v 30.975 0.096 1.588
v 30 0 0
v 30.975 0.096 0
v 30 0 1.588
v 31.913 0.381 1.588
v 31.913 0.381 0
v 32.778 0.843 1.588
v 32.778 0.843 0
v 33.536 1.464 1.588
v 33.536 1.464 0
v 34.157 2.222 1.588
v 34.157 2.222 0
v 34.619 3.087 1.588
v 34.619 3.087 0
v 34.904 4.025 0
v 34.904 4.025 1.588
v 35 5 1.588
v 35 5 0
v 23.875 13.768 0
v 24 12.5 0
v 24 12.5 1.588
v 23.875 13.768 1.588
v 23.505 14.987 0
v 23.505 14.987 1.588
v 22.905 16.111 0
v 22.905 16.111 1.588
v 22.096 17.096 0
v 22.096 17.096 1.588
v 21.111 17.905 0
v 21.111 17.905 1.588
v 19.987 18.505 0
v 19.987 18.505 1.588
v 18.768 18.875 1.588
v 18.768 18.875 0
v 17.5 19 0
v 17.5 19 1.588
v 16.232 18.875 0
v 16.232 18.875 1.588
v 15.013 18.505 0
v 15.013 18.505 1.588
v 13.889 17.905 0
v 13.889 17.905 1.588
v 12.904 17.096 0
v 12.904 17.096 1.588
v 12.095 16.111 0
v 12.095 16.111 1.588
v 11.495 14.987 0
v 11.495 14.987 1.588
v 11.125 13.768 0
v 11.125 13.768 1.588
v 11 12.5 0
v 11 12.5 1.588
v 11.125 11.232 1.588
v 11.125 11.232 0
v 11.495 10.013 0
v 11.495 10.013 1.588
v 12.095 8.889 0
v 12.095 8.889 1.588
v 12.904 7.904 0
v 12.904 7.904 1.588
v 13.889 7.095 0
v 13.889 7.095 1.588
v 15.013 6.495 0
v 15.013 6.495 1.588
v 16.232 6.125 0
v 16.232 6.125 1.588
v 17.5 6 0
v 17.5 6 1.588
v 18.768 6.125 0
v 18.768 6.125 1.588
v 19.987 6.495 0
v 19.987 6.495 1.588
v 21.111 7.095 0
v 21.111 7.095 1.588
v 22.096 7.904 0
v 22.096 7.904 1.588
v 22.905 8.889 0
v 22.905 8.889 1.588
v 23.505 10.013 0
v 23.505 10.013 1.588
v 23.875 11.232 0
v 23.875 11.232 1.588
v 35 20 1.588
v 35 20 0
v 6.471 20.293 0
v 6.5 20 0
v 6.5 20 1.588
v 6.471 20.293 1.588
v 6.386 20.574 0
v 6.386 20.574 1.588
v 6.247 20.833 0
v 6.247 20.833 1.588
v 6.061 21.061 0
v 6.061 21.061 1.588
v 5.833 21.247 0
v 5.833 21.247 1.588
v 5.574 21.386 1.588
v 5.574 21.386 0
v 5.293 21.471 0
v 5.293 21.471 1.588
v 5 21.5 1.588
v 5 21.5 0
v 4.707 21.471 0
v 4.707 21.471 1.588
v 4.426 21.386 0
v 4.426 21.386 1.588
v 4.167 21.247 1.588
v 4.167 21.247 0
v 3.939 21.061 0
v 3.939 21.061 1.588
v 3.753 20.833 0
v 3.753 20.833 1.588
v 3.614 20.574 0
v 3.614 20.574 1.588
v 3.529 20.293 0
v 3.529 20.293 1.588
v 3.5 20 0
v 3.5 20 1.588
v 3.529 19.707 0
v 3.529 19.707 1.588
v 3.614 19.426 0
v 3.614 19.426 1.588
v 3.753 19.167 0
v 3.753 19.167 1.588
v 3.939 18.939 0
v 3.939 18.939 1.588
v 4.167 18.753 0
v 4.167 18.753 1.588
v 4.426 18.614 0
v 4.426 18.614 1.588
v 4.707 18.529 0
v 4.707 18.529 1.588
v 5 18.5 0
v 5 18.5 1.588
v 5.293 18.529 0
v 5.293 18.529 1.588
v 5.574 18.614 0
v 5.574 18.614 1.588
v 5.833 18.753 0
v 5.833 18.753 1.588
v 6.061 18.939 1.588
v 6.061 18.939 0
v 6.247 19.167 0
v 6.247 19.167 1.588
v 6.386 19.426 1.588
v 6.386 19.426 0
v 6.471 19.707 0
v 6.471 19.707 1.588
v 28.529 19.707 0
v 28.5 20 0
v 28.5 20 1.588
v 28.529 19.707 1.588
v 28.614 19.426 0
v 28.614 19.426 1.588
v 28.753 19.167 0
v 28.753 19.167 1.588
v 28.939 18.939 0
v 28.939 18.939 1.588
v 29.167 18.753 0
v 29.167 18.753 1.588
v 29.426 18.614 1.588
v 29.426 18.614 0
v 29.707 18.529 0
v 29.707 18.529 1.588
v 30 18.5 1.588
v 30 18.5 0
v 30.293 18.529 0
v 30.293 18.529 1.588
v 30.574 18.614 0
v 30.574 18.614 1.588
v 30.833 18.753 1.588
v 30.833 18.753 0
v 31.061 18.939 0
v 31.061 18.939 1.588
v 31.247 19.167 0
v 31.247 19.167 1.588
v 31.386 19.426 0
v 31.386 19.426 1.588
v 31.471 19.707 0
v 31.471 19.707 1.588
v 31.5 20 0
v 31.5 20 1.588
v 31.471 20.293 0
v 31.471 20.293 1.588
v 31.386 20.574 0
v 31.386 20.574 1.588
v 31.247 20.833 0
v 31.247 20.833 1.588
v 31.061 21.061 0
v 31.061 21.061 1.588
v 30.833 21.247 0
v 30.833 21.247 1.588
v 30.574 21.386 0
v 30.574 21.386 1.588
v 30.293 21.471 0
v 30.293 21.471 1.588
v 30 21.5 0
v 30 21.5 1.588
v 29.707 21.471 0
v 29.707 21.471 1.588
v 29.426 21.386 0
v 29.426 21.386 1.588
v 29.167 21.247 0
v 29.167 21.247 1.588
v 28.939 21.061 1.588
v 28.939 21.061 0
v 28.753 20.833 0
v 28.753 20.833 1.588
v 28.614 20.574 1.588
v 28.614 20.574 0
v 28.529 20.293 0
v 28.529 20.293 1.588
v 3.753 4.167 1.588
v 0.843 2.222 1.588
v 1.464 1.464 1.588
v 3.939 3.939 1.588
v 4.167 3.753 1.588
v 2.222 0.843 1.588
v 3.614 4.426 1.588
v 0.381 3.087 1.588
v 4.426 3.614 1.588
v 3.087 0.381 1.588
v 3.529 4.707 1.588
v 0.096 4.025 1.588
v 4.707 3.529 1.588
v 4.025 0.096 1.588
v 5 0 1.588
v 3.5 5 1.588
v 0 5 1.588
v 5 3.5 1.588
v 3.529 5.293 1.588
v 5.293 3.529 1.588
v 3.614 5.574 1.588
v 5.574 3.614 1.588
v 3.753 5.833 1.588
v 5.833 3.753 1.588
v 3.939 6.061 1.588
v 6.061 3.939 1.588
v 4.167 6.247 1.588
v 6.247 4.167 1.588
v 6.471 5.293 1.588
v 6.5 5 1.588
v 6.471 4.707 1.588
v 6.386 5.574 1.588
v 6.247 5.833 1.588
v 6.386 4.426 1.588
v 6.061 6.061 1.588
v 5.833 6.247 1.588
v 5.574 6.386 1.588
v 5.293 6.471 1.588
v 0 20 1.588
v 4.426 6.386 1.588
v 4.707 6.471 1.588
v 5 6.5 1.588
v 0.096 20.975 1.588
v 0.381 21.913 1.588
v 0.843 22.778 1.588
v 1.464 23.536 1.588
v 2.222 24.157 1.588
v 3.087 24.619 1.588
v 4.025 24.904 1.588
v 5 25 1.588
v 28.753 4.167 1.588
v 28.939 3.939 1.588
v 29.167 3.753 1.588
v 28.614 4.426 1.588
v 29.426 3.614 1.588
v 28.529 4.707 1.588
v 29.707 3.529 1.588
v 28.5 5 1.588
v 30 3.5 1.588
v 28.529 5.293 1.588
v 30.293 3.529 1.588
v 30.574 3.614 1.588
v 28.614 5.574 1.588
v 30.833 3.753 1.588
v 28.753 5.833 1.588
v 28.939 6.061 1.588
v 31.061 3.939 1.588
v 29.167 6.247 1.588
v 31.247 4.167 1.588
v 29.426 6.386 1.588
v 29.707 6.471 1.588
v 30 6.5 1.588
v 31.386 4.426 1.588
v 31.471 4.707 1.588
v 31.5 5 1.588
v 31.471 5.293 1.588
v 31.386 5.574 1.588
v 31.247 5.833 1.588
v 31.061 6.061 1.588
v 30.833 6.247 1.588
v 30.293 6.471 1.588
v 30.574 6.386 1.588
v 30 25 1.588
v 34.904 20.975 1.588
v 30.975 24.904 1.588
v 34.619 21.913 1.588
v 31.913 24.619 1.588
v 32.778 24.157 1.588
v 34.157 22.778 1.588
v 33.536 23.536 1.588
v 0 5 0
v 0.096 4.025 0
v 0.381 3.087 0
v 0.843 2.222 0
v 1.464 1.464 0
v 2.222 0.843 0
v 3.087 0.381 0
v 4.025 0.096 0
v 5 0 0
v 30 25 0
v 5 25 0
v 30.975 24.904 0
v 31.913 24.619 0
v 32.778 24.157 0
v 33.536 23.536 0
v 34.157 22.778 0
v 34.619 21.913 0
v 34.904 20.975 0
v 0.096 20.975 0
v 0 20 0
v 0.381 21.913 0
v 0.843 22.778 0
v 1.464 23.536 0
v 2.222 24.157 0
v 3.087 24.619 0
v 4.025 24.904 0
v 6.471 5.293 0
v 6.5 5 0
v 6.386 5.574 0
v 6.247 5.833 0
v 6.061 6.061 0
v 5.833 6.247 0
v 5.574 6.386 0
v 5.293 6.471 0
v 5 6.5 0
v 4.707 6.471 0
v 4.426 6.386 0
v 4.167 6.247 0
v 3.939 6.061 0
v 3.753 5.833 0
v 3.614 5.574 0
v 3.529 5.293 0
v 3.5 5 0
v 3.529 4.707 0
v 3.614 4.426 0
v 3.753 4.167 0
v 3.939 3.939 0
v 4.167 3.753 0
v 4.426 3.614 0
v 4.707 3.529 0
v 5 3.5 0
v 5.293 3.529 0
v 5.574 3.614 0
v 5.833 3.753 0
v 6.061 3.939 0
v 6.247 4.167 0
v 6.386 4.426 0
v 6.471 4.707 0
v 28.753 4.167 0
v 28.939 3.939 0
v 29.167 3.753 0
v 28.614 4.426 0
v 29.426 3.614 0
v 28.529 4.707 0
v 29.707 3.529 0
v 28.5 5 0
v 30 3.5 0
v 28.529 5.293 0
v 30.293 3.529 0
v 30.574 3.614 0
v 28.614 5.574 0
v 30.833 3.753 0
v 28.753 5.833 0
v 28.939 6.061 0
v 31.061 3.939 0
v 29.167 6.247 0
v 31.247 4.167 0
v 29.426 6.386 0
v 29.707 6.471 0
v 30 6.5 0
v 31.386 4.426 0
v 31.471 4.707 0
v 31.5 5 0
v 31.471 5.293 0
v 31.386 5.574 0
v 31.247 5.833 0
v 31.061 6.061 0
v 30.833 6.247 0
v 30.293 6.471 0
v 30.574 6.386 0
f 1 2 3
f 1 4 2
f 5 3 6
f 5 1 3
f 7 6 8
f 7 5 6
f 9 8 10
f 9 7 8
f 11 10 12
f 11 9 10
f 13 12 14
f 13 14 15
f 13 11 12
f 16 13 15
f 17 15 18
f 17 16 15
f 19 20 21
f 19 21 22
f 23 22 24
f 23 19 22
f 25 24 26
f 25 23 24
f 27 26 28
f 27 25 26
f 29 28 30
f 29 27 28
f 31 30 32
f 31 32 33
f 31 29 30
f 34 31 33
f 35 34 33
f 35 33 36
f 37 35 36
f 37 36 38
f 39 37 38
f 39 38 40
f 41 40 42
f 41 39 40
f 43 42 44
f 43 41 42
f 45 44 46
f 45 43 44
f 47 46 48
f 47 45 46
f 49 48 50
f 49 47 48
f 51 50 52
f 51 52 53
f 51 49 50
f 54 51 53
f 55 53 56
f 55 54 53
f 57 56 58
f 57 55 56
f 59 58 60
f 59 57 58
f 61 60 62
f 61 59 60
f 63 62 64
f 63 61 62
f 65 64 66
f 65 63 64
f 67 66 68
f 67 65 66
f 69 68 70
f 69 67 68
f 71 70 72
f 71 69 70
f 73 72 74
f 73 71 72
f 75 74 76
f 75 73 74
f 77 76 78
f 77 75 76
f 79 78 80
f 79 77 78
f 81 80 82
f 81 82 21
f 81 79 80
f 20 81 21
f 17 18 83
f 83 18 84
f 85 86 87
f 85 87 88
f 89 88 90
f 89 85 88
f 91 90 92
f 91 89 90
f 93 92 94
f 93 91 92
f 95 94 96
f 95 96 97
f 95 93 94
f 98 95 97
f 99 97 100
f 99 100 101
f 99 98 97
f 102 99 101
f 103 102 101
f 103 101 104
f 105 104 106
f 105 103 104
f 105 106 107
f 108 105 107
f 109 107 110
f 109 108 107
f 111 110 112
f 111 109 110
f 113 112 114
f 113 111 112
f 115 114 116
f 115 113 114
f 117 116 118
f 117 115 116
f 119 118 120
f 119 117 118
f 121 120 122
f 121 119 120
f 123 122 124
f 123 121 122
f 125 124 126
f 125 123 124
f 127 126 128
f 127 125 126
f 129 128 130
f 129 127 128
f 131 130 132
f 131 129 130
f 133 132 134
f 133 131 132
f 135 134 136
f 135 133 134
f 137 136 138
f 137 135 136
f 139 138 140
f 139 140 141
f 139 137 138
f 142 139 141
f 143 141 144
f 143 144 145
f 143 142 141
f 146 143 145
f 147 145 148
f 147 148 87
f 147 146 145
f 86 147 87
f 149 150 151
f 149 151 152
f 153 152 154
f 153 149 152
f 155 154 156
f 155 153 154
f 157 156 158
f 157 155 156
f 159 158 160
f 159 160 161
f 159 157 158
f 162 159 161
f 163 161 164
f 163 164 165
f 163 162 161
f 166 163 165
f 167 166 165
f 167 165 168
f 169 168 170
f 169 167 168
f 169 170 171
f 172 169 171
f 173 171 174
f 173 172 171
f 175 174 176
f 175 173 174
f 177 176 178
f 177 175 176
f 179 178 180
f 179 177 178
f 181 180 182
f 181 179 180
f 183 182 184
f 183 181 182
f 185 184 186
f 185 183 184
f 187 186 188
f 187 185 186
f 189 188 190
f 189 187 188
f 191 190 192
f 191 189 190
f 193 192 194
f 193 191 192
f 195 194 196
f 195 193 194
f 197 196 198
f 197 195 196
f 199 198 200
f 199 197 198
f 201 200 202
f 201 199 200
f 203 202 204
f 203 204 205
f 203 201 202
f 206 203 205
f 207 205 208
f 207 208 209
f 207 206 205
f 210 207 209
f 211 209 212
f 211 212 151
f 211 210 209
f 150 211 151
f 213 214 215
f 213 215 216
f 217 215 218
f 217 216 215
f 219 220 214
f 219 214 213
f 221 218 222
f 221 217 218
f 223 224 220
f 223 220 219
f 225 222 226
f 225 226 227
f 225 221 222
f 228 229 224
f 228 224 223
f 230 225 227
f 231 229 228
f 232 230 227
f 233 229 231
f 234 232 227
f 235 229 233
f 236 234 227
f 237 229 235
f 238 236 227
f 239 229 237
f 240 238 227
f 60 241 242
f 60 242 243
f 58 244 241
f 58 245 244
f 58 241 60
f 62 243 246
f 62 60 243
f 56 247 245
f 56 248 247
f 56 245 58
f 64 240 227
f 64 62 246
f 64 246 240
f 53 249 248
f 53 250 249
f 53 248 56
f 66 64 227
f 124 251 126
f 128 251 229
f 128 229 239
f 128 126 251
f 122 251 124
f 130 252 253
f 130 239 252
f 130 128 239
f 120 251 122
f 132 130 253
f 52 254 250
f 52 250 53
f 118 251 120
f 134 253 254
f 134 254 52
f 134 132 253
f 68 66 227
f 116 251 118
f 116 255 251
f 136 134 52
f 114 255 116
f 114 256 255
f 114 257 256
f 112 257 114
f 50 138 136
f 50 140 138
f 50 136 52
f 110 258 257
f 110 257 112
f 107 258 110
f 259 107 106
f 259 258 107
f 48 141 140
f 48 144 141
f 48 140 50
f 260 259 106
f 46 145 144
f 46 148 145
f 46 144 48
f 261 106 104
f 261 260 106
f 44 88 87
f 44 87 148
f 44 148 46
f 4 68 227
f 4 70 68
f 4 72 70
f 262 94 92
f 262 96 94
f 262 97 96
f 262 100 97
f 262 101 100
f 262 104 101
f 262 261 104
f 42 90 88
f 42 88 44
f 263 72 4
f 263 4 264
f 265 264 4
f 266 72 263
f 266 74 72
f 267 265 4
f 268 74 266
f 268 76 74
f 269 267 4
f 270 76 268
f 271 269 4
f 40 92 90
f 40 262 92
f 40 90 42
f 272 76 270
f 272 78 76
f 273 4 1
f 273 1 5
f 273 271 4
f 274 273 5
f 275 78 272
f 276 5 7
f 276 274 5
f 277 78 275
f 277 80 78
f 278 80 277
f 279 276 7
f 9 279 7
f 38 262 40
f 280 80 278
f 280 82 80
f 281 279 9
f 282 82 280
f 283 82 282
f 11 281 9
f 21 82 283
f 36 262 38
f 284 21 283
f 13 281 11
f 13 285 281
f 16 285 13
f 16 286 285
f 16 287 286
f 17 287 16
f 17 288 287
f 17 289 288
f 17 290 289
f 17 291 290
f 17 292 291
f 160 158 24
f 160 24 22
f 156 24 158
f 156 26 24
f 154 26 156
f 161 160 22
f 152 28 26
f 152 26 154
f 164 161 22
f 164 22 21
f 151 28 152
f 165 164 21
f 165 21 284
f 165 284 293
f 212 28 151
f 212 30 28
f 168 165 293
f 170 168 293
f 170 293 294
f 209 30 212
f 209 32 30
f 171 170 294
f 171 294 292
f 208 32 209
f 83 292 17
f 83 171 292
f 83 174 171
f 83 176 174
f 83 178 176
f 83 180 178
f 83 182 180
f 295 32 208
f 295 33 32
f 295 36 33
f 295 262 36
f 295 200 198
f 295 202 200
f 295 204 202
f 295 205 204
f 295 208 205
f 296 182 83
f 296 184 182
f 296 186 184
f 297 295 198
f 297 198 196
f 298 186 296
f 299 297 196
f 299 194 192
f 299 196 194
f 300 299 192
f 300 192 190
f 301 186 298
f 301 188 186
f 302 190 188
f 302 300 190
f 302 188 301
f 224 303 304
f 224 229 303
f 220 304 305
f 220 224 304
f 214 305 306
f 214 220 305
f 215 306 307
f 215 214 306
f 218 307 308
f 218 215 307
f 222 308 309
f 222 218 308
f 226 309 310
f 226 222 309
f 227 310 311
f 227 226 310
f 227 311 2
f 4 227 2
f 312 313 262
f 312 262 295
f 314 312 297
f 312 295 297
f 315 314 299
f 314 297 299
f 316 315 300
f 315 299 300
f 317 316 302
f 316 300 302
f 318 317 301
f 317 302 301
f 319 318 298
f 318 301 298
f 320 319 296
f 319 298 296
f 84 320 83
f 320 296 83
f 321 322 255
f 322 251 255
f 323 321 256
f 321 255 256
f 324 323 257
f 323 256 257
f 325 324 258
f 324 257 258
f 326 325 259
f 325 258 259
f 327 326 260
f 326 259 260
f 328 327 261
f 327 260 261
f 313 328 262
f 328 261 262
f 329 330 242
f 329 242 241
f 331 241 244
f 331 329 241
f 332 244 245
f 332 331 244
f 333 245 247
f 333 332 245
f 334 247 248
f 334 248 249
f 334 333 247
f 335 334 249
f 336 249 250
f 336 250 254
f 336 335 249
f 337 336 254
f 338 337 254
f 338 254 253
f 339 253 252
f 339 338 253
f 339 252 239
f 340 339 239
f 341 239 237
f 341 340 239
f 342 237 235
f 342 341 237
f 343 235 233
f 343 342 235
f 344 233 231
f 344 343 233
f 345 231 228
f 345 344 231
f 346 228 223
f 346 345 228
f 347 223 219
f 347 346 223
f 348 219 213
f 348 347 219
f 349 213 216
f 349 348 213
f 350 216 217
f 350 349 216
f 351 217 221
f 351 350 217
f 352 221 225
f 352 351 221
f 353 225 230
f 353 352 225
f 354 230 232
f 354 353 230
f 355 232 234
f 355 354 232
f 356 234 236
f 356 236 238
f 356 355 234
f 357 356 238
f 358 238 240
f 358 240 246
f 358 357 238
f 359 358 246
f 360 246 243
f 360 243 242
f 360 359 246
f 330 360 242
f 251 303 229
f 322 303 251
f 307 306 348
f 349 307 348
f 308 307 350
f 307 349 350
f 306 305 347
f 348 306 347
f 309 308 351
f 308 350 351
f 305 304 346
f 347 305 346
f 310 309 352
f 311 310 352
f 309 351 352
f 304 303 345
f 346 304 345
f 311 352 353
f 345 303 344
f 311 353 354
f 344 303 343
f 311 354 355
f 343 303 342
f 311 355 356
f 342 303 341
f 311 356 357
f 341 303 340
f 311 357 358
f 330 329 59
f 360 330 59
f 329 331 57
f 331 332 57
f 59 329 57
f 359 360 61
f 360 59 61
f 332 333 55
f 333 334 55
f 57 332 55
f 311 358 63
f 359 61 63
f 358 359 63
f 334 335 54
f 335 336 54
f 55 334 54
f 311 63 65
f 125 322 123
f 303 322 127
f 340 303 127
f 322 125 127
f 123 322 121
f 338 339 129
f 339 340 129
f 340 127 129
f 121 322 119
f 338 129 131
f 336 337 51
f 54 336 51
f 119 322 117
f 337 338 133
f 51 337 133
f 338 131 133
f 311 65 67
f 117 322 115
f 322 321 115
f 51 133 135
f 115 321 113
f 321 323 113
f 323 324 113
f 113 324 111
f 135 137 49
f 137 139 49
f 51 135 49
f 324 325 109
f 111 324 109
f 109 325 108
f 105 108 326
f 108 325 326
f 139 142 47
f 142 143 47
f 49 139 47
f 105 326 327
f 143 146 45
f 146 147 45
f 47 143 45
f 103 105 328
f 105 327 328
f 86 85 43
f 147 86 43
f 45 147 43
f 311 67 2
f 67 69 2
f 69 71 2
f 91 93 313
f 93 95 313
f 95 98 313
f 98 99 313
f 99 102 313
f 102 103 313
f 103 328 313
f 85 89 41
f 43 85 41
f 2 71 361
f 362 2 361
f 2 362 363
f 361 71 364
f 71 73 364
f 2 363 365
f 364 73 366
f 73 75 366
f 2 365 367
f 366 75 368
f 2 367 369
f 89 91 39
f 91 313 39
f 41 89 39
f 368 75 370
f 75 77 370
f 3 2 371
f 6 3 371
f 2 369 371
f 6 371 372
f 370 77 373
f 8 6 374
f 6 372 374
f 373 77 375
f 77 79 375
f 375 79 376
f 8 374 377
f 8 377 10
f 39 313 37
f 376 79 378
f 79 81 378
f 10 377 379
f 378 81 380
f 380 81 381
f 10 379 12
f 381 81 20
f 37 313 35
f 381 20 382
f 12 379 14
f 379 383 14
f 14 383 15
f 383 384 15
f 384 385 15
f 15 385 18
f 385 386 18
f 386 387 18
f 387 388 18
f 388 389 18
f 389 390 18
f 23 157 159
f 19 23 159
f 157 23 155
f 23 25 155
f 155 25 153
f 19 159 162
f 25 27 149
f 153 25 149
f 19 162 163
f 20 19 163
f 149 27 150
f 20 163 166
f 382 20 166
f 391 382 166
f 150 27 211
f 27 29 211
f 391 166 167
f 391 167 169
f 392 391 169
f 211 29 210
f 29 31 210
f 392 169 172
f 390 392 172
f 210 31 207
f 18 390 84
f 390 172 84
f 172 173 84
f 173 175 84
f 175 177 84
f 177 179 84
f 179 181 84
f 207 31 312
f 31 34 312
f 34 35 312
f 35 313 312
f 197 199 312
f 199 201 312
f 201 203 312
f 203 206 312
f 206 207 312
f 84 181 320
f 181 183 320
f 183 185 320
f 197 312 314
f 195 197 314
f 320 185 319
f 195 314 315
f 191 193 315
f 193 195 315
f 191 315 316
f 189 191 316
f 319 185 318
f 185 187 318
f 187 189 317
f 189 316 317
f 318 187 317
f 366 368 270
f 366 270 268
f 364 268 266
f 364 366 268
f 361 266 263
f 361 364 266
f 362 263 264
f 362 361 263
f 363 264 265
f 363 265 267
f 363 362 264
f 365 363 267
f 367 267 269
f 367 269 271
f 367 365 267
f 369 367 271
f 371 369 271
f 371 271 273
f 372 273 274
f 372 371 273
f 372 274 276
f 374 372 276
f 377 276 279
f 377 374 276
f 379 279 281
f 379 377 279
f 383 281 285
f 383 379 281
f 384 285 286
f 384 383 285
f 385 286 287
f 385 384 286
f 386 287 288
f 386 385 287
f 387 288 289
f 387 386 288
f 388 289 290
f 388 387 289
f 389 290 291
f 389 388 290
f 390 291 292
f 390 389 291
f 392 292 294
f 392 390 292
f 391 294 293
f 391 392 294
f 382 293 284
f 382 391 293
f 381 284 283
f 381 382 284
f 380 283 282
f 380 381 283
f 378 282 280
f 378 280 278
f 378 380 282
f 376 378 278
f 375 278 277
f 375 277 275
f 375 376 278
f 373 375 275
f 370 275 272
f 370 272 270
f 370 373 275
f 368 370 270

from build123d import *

# Parameters (mm, degrees)
SKETCH1_W           = 35
SKETCH1_H           = 25
SKETCH1_R           = 6.5
SKETCH1_R_2         = 1.5
BOSS_EXTRUDE1_DEPTH = 1.5875
FILLET1_R           = 5


with BuildPart() as part:
    # Sketch1 → Boss-Extrude1 (new body)
    with BuildSketch(Plane.XY):
        with Locations((17.5, 12.5)):
            Rectangle(SKETCH1_W, SKETCH1_H)
        with Locations((17.5, 12.5)):
            Circle(SKETCH1_R, mode=Mode.SUBTRACT)
        with Locations((5, 20)):
            Circle(SKETCH1_R_2, mode=Mode.SUBTRACT)
        with Locations((5, 5)):
            Circle(SKETCH1_R_2, mode=Mode.SUBTRACT)
        with Locations(Location((30, 5, 0), (0, 0, 180))):
            Circle(SKETCH1_R_2, mode=Mode.SUBTRACT)
        with Locations(Location((30, 20, 0), (0, 0, 180))):
            Circle(SKETCH1_R_2, mode=Mode.SUBTRACT)
    extrude(amount=BOSS_EXTRUDE1_DEPTH)

    # Fillet1
    fillet1_edges = [part.edges().sort_by_distance(p)[0] for p in [
        (0, 0, 0.79375),
        (0, 25, 0.79375),
        (35, 25, 0.79375),
        (35, 0, 0.79375),
    ]]
    fillet(fillet1_edges, radius=FILLET1_R)


solid = part.part
